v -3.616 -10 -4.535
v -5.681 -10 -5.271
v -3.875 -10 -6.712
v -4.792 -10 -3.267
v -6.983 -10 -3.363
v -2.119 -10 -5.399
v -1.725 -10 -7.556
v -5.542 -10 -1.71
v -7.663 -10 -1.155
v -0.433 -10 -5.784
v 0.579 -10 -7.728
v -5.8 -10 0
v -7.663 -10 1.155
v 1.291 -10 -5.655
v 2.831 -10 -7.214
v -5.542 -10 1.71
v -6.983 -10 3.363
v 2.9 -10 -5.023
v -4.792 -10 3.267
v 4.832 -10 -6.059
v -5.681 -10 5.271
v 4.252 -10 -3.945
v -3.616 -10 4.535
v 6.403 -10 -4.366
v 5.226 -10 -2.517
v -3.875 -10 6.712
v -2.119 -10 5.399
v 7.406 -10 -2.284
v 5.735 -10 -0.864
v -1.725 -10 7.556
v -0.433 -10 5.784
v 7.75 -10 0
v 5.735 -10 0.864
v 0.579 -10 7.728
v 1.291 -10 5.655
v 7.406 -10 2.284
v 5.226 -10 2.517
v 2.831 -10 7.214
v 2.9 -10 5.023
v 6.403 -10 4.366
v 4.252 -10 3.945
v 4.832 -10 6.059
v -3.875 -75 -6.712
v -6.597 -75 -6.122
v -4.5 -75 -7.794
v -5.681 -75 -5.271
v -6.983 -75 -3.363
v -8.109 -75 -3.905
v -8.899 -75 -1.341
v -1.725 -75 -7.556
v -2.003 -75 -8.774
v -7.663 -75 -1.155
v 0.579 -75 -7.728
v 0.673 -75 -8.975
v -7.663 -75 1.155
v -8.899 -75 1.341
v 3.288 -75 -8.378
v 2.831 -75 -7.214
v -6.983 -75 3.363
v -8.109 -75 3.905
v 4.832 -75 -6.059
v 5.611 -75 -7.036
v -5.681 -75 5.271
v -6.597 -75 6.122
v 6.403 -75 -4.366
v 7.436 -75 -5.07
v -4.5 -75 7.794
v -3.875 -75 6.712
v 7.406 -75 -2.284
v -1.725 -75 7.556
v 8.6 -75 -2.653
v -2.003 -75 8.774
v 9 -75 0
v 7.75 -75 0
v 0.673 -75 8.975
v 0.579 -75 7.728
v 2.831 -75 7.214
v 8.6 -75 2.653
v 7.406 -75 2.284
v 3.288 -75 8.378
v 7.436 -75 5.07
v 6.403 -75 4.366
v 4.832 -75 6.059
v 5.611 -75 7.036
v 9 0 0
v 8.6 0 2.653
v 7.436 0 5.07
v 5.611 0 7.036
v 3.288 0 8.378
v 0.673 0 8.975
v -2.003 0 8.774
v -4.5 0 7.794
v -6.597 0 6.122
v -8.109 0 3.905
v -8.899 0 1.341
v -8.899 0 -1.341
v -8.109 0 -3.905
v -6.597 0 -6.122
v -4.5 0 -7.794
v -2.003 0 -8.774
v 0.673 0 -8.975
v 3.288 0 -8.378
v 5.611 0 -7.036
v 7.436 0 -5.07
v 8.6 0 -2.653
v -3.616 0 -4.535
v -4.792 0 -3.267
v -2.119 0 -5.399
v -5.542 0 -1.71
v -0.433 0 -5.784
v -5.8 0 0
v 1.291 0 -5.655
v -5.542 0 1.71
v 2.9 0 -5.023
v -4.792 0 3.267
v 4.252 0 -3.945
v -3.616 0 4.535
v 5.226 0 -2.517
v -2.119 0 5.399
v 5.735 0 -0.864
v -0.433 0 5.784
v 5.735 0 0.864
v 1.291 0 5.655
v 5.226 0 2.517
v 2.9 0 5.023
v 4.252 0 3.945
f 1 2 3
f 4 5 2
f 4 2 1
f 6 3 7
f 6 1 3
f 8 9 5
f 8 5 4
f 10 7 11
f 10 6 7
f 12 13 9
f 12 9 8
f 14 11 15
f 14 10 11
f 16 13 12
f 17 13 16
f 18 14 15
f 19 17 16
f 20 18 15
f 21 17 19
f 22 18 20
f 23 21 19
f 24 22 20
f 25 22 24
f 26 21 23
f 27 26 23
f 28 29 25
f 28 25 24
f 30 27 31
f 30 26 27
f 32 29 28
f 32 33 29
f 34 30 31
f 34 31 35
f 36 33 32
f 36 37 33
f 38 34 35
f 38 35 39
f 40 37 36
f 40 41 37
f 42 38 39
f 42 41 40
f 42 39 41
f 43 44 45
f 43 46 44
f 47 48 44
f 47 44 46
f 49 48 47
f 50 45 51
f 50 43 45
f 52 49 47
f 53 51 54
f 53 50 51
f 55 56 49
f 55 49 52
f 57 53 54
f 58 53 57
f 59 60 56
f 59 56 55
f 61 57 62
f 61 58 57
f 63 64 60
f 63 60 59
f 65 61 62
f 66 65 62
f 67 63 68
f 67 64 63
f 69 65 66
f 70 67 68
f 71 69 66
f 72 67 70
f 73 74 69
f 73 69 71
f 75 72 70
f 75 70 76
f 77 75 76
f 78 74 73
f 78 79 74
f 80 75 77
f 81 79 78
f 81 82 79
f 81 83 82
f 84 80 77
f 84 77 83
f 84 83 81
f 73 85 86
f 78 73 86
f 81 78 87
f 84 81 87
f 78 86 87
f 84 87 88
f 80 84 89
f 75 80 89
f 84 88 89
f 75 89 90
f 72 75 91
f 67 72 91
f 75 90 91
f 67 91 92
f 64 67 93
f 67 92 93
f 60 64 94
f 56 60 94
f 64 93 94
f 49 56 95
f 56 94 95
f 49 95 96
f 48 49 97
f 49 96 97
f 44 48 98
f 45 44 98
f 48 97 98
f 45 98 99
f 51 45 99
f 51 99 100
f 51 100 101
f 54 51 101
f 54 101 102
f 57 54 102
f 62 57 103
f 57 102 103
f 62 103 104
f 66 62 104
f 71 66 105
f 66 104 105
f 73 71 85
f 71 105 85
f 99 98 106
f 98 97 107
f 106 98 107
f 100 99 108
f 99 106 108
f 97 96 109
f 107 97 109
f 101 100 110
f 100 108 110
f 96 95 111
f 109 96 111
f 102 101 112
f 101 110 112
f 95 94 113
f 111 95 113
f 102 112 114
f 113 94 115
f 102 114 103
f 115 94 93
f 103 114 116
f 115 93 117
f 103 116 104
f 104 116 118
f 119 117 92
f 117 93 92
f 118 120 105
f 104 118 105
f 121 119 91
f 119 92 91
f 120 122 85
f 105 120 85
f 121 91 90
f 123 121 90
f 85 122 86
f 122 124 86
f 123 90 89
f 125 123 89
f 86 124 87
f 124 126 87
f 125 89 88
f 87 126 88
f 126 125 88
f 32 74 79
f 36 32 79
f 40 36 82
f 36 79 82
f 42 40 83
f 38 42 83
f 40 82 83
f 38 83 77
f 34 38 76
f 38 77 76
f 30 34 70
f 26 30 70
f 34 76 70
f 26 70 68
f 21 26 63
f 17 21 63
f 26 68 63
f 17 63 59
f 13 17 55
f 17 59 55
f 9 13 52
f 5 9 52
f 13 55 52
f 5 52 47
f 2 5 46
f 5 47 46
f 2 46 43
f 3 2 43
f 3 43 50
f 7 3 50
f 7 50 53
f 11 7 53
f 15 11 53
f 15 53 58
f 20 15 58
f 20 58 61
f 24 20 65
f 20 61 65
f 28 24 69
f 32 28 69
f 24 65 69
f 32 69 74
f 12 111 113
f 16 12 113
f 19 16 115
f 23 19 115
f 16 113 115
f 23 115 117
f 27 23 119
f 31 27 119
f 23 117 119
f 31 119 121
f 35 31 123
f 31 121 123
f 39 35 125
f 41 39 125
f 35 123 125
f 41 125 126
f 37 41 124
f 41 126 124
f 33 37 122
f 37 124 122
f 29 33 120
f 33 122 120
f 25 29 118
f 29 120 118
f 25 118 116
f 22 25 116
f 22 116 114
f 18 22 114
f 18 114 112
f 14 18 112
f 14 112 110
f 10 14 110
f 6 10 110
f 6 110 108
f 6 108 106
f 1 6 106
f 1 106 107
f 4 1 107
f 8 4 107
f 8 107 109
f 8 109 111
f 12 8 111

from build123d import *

# Parameters (mm, degrees)
F0_R     = 9
F1_DEPTH = 75
F2_R     = 7.75
F3_DEPTH = 65
F4_R     = 5.8
F5_DEPTH = 75.001


with BuildPart() as f1:
    # F0 (on Front) → F1 (new body)
    with BuildSketch(Plane.XZ):
        Circle(F0_R)
    extrude(amount=F1_DEPTH)

    # F2 (on face) → F3 (cut)
    with BuildSketch(Plane.XZ.offset(75)):
        Circle(F2_R)
    extrude(amount=-F3_DEPTH, mode=Mode.SUBTRACT)

    # F4 (on face) → F5 (cut, through all)
    with BuildSketch(Plane(origin=(0, 0, 0), x_dir=(-1, 0, 0), z_dir=(0, 1, 0))):
        Circle(F4_R)
    extrude(amount=-F5_DEPTH, mode=Mode.SUBTRACT)


solid = f1.part
